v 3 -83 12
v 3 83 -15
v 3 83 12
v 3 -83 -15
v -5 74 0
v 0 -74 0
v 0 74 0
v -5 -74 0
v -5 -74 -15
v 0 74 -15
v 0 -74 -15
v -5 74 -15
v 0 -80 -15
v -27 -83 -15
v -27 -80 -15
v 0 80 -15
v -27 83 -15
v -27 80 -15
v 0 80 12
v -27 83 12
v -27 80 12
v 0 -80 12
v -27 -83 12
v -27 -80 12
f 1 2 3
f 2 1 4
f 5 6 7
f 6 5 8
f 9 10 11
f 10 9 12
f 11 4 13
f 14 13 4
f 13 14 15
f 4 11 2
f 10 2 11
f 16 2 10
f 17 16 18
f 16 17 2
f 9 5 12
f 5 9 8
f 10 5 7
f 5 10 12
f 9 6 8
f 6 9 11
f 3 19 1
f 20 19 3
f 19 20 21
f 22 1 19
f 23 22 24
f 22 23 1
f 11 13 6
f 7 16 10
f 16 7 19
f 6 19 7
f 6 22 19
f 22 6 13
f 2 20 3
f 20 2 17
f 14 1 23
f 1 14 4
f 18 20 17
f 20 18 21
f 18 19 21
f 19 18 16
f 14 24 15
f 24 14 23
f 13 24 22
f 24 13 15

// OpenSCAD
$fn=60;

// konstanter / parametre

TYKKING = 3; // hvor tykk er lista rundt trelista
H_NEDE = 15; // høyde under "streken"
H_OPPE = 12; // høyde over "streken"
INDRE_VIDDE = 148;
EKSTRA_TYKKING = 5;
TRE_VIDDE = 6;
TRE_DYBDE = 24;
EKSTRA_INN_BAK = 4;

// avledede verdier
FULL_VIDDE = INDRE_VIDDE + 2 * (TYKKING + TRE_VIDDE);

translate([-EKSTRA_TYKKING,-INDRE_VIDDE/2,-H_NEDE]) 
    cube([TYKKING+EKSTRA_TYKKING,INDRE_VIDDE,H_NEDE]);
translate([0,-FULL_VIDDE/2,-H_NEDE])
    cube([TYKKING, FULL_VIDDE,H_NEDE+H_OPPE]);
translate([-TRE_DYBDE-TYKKING,INDRE_VIDDE/2+TRE_VIDDE,-H_NEDE])
    cube([TRE_DYBDE+2*TYKKING,TYKKING,H_NEDE+H_OPPE]);
translate([-TRE_DYBDE-TYKKING,-INDRE_VIDDE/2-TRE_VIDDE-TYKKING,-H_NEDE])
    cube([TRE_DYBDE+2*TYKKING,TYKKING,H_NEDE+H_OPPE]);
